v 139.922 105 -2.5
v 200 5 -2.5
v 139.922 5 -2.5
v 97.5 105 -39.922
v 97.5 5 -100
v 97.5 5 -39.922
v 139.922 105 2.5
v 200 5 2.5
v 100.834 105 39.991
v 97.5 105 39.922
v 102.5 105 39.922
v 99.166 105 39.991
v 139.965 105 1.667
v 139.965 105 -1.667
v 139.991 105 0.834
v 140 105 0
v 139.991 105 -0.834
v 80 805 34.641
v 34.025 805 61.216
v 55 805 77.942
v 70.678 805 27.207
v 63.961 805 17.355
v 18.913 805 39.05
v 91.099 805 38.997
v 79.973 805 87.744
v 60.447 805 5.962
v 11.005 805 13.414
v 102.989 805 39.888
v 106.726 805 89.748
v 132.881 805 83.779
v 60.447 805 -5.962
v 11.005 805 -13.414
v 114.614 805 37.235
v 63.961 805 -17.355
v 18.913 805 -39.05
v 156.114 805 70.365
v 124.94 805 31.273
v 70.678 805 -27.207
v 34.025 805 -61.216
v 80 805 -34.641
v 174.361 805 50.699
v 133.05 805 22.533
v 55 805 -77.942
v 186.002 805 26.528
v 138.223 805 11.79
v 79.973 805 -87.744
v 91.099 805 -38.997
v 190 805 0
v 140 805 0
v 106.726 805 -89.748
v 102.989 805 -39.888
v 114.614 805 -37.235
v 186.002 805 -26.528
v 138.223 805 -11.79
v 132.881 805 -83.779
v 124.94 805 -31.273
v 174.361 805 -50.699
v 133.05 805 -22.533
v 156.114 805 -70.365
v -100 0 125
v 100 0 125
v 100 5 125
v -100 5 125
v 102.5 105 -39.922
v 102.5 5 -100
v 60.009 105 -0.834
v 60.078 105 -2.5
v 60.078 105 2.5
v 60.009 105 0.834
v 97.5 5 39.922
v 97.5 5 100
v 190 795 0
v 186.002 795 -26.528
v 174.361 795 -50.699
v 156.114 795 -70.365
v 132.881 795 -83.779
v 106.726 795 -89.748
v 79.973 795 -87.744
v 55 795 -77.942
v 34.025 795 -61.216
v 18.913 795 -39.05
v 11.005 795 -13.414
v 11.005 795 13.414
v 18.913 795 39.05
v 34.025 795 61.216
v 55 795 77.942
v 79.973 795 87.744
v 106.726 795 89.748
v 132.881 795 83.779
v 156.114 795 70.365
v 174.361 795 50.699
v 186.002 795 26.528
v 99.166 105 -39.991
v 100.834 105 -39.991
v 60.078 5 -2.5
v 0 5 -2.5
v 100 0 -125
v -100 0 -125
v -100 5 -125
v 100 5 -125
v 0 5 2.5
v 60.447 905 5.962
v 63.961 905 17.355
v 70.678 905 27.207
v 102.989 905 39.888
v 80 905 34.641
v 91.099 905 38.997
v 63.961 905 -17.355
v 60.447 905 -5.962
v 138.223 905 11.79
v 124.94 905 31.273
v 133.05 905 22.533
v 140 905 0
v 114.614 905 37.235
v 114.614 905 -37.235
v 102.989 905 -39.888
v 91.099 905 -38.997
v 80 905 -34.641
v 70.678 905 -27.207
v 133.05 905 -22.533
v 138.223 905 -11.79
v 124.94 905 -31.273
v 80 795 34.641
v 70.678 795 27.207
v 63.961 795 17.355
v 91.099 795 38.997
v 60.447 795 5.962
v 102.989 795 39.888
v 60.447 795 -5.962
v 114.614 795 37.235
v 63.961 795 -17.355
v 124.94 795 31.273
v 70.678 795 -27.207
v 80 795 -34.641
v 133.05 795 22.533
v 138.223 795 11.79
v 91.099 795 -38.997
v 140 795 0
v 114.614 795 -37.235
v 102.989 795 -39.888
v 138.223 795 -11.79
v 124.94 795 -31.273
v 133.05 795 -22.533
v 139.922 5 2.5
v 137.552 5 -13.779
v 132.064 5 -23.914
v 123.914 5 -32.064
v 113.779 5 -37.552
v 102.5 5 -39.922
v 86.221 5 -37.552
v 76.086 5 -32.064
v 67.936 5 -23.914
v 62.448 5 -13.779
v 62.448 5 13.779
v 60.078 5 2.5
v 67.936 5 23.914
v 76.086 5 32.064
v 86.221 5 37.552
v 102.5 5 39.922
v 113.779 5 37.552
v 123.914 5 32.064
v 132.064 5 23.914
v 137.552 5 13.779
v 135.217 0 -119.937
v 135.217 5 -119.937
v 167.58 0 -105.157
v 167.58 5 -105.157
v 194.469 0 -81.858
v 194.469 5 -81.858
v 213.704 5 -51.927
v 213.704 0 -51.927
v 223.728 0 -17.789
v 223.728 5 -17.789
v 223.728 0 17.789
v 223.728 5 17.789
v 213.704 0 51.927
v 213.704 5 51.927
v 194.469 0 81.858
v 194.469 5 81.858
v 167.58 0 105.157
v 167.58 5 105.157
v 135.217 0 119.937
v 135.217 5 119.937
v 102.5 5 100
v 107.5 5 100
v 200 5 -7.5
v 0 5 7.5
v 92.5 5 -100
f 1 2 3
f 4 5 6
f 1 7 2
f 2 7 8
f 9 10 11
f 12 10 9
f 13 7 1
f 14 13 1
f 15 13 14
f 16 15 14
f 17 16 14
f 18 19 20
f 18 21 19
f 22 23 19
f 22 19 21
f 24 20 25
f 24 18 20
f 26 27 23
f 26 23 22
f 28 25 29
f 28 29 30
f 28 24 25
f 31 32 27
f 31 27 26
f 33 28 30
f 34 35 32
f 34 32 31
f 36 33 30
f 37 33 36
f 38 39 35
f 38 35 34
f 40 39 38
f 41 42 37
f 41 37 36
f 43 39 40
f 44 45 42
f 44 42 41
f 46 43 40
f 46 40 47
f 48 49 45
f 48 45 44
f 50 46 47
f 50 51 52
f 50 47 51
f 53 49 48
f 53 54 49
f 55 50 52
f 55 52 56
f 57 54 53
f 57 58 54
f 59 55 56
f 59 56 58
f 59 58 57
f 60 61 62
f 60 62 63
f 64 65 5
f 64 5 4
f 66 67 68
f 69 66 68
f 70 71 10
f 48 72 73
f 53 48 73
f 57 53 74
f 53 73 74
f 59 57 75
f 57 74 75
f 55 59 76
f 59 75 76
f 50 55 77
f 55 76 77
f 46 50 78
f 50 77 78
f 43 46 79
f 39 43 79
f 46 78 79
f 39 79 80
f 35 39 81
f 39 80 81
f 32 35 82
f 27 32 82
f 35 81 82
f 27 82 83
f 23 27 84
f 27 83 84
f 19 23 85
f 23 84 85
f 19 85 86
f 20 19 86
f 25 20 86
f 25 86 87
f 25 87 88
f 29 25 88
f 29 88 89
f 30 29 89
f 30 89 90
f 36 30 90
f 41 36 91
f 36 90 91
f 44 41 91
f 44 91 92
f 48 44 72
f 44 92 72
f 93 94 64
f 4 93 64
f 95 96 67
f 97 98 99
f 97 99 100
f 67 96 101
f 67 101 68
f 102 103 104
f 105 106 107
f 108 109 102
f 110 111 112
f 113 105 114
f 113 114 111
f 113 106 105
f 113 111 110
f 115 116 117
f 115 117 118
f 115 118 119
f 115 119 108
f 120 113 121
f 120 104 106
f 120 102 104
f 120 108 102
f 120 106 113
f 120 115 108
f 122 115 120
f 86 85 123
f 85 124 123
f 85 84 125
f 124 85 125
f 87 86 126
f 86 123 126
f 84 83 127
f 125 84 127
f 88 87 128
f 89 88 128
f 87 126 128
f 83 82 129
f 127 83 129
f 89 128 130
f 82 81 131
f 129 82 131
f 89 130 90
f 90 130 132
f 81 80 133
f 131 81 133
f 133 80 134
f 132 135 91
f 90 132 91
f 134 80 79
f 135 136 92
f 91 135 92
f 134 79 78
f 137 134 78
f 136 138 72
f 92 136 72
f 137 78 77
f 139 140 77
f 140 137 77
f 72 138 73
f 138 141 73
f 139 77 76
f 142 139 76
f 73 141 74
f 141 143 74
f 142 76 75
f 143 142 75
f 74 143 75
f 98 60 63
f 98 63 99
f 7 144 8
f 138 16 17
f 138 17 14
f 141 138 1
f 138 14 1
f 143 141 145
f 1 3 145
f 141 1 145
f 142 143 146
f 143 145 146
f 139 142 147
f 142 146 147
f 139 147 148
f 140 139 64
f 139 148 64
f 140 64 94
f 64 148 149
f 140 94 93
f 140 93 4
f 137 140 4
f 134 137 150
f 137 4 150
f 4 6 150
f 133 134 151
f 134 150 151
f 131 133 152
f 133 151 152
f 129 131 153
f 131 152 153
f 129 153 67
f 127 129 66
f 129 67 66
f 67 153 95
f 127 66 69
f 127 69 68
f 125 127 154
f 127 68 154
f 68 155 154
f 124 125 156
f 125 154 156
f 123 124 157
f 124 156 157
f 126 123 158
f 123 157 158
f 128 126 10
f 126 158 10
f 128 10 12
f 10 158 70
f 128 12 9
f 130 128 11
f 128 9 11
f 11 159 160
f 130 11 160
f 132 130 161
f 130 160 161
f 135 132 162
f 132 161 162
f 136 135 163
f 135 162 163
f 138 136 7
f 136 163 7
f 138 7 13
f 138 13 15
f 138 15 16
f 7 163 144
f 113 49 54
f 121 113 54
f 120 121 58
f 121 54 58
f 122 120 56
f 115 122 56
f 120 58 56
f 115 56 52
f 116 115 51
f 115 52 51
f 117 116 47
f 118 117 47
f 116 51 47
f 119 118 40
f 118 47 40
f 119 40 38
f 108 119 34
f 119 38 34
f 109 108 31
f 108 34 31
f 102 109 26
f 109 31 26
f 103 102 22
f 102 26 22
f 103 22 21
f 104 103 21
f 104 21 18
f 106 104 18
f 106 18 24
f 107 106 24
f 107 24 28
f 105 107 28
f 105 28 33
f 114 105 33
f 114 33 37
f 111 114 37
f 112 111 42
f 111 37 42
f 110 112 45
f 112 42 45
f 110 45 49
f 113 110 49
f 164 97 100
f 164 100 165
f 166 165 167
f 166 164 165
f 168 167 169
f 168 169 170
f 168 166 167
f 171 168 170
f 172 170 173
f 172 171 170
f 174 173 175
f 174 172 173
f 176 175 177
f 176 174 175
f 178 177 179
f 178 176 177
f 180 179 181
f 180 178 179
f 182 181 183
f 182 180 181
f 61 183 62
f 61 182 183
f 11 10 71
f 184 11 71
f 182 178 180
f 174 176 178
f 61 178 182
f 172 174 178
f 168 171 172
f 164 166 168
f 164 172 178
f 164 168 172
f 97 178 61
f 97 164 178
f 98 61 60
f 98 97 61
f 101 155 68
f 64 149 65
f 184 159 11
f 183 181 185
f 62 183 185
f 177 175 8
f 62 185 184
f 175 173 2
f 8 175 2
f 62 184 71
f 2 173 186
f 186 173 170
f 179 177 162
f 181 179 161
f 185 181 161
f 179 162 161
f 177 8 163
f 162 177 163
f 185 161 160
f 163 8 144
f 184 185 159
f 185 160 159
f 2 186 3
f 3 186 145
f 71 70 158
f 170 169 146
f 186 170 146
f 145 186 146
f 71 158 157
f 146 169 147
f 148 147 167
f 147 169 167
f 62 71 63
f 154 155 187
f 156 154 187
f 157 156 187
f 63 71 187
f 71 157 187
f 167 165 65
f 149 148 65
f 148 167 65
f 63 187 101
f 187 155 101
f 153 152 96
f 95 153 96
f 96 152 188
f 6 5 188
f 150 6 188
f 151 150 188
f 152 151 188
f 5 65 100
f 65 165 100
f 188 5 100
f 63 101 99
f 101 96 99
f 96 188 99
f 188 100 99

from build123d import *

# Parameters (mm, degrees)
EXTRUDE_2_DEPTH     = 5
SKETCH_5_R          = 40
EXTRUDE_5_DEPTH     = 100
EXTRUDE_6_DEPTH     = 100
CUT_EXTRUDE_1_DEPTH = 10
CUT_EXTRUDE_2_DEPTH = 10
CUT_EXTRUDE_3_DEPTH = 10
CUT_EXTRUDE_4_DEPTH = 10
SKETCH_11_R         = 40
EXTRUDE_7_DEPTH     = 690
SKETCH_12_R         = 90
EXTRUDE_8_DEPTH     = 10
SKETCH_13_R         = 40
EXTRUDE_9_DEPTH     = 100


with BuildPart() as part:
    # 草图1 → 凸台-拉伸2 (new body)
    with BuildSketch(Plane(origin=(0, 0, 0), x_dir=(1, 0, 0), z_dir=(0, 1, 0))):
        with BuildLine():
            Line((100, -125), (-100, -125))
            Line((-100, -125), (-100, 125))
            Line((-100, 125), (100, 125))
            ThreePointArc((100, 125), (225, 0), (100, -125))
        make_face()
    extrude(amount=EXTRUDE_2_DEPTH)

    # 草图5 → 凸台-拉伸5 (add)
    with BuildSketch(Plane(origin=(0, 5, 0), x_dir=(1, 0, 0), z_dir=(0, 1, 0))):
        with Locations((100, 0)):
            Circle(SKETCH_5_R)
    extrude(amount=EXTRUDE_5_DEPTH)

    # 草图6 → 凸台-拉伸6 (add)
    with BuildSketch(Plane(origin=(0, 5, 0), x_dir=(1, 0, 0), z_dir=(0, 1, 0))):
        with BuildLine():
            Line((102.5, -100), (97.5, -100))
            Line((97.5, -100), (97.5, -39.921798557))
            ThreePointArc((97.5, -39.921798557), (100, -40), (102.5, -39.921798557))
            Line((102.5, -39.921798557), (102.5, -100))
        make_face()
        with BuildLine():
            Line((0, -2.5), (0, 2.5))
            Line((0, 2.5), (60.078201443, 2.5))
            ThreePointArc((60.078201443, 2.5), (60, 0), (60.078201443, -2.5))
            Line((60.078201443, -2.5), (0, -2.5))
        make_face()
        with BuildLine():
            Line((102.5, 100), (97.5, 100))
            Line((97.5, 100), (97.5, 39.921798557))
            ThreePointArc((97.5, 39.921798557), (100, 40), (102.5, 39.921798557))
            Line((102.5, 39.921798557), (102.5, 100))
        make_face()
        with BuildLine():
            Line((200, -2.5), (200, 2.5))
            Line((200, 2.5), (139.921798557, 2.5))
            ThreePointArc((139.921798557, 2.5), (140, 0), (139.921798557, -2.5))
            Line((139.921798557, -2.5), (200, -2.5))
        make_face()
    extrude(amount=EXTRUDE_6_DEPTH)

    # 草图7 → 切除-拉伸1 (cut)
    with BuildSketch(Plane.ZY.offset(-97.5)):
        Polygon((39.921798557, 105), (100, 5), (100, 105), align=None)
    extrude(amount=-CUT_EXTRUDE_1_DEPTH, mode=Mode.SUBTRACT)

    # 草图8 → 切除-拉伸2 (cut)
    with BuildSketch(Plane.XY.offset(2.5)):
        Polygon((139.921798557, 105), (200, 5), (200, 105), align=None)
    extrude(amount=-CUT_EXTRUDE_2_DEPTH, mode=Mode.SUBTRACT)

    # 草图9 → 切除-拉伸3 (cut)
    with BuildSketch(Plane(origin=(102.5, 0, 0), x_dir=(0, 0, -1), z_dir=(1, 0, 0))):
        Polygon((39.921798557, 105), (100, 105), (100, 5), align=None)
    extrude(amount=-CUT_EXTRUDE_3_DEPTH, mode=Mode.SUBTRACT)

    # 草图10 → 切除-拉伸4 (cut)
    with BuildSketch(Plane(origin=(0, 0, -2.5), x_dir=(-1, 0, 0), z_dir=(0, 0, -1))):
        Polygon((0, 105), (0, 5), (-60.078201443, 105), align=None)
    extrude(amount=-CUT_EXTRUDE_4_DEPTH, mode=Mode.SUBTRACT)

    # 草图11 → 凸台-拉伸7 (add)
    with BuildSketch(Plane(origin=(0, 105, 0), x_dir=(1, 0, 0), z_dir=(0, 1, 0))):
        with Locations((100, 0)):
            Circle(SKETCH_11_R)
    extrude(amount=EXTRUDE_7_DEPTH)

    # 草图12 → 凸台-拉伸8 (add)
    with BuildSketch(Plane(origin=(0, 795, 0), x_dir=(1, 0, 0), z_dir=(0, 1, 0))):
        with Locations((100, 0)):
            Circle(SKETCH_12_R)
    extrude(amount=EXTRUDE_8_DEPTH)

    # 草图13 → 凸台-拉伸9 (add)
    with BuildSketch(Plane(origin=(0, 805, 0), x_dir=(1, 0, 0), z_dir=(0, 1, 0))):
        with Locations((100, 0)):
            Circle(SKETCH_13_R)
    extrude(amount=EXTRUDE_9_DEPTH)


solid = part.part
